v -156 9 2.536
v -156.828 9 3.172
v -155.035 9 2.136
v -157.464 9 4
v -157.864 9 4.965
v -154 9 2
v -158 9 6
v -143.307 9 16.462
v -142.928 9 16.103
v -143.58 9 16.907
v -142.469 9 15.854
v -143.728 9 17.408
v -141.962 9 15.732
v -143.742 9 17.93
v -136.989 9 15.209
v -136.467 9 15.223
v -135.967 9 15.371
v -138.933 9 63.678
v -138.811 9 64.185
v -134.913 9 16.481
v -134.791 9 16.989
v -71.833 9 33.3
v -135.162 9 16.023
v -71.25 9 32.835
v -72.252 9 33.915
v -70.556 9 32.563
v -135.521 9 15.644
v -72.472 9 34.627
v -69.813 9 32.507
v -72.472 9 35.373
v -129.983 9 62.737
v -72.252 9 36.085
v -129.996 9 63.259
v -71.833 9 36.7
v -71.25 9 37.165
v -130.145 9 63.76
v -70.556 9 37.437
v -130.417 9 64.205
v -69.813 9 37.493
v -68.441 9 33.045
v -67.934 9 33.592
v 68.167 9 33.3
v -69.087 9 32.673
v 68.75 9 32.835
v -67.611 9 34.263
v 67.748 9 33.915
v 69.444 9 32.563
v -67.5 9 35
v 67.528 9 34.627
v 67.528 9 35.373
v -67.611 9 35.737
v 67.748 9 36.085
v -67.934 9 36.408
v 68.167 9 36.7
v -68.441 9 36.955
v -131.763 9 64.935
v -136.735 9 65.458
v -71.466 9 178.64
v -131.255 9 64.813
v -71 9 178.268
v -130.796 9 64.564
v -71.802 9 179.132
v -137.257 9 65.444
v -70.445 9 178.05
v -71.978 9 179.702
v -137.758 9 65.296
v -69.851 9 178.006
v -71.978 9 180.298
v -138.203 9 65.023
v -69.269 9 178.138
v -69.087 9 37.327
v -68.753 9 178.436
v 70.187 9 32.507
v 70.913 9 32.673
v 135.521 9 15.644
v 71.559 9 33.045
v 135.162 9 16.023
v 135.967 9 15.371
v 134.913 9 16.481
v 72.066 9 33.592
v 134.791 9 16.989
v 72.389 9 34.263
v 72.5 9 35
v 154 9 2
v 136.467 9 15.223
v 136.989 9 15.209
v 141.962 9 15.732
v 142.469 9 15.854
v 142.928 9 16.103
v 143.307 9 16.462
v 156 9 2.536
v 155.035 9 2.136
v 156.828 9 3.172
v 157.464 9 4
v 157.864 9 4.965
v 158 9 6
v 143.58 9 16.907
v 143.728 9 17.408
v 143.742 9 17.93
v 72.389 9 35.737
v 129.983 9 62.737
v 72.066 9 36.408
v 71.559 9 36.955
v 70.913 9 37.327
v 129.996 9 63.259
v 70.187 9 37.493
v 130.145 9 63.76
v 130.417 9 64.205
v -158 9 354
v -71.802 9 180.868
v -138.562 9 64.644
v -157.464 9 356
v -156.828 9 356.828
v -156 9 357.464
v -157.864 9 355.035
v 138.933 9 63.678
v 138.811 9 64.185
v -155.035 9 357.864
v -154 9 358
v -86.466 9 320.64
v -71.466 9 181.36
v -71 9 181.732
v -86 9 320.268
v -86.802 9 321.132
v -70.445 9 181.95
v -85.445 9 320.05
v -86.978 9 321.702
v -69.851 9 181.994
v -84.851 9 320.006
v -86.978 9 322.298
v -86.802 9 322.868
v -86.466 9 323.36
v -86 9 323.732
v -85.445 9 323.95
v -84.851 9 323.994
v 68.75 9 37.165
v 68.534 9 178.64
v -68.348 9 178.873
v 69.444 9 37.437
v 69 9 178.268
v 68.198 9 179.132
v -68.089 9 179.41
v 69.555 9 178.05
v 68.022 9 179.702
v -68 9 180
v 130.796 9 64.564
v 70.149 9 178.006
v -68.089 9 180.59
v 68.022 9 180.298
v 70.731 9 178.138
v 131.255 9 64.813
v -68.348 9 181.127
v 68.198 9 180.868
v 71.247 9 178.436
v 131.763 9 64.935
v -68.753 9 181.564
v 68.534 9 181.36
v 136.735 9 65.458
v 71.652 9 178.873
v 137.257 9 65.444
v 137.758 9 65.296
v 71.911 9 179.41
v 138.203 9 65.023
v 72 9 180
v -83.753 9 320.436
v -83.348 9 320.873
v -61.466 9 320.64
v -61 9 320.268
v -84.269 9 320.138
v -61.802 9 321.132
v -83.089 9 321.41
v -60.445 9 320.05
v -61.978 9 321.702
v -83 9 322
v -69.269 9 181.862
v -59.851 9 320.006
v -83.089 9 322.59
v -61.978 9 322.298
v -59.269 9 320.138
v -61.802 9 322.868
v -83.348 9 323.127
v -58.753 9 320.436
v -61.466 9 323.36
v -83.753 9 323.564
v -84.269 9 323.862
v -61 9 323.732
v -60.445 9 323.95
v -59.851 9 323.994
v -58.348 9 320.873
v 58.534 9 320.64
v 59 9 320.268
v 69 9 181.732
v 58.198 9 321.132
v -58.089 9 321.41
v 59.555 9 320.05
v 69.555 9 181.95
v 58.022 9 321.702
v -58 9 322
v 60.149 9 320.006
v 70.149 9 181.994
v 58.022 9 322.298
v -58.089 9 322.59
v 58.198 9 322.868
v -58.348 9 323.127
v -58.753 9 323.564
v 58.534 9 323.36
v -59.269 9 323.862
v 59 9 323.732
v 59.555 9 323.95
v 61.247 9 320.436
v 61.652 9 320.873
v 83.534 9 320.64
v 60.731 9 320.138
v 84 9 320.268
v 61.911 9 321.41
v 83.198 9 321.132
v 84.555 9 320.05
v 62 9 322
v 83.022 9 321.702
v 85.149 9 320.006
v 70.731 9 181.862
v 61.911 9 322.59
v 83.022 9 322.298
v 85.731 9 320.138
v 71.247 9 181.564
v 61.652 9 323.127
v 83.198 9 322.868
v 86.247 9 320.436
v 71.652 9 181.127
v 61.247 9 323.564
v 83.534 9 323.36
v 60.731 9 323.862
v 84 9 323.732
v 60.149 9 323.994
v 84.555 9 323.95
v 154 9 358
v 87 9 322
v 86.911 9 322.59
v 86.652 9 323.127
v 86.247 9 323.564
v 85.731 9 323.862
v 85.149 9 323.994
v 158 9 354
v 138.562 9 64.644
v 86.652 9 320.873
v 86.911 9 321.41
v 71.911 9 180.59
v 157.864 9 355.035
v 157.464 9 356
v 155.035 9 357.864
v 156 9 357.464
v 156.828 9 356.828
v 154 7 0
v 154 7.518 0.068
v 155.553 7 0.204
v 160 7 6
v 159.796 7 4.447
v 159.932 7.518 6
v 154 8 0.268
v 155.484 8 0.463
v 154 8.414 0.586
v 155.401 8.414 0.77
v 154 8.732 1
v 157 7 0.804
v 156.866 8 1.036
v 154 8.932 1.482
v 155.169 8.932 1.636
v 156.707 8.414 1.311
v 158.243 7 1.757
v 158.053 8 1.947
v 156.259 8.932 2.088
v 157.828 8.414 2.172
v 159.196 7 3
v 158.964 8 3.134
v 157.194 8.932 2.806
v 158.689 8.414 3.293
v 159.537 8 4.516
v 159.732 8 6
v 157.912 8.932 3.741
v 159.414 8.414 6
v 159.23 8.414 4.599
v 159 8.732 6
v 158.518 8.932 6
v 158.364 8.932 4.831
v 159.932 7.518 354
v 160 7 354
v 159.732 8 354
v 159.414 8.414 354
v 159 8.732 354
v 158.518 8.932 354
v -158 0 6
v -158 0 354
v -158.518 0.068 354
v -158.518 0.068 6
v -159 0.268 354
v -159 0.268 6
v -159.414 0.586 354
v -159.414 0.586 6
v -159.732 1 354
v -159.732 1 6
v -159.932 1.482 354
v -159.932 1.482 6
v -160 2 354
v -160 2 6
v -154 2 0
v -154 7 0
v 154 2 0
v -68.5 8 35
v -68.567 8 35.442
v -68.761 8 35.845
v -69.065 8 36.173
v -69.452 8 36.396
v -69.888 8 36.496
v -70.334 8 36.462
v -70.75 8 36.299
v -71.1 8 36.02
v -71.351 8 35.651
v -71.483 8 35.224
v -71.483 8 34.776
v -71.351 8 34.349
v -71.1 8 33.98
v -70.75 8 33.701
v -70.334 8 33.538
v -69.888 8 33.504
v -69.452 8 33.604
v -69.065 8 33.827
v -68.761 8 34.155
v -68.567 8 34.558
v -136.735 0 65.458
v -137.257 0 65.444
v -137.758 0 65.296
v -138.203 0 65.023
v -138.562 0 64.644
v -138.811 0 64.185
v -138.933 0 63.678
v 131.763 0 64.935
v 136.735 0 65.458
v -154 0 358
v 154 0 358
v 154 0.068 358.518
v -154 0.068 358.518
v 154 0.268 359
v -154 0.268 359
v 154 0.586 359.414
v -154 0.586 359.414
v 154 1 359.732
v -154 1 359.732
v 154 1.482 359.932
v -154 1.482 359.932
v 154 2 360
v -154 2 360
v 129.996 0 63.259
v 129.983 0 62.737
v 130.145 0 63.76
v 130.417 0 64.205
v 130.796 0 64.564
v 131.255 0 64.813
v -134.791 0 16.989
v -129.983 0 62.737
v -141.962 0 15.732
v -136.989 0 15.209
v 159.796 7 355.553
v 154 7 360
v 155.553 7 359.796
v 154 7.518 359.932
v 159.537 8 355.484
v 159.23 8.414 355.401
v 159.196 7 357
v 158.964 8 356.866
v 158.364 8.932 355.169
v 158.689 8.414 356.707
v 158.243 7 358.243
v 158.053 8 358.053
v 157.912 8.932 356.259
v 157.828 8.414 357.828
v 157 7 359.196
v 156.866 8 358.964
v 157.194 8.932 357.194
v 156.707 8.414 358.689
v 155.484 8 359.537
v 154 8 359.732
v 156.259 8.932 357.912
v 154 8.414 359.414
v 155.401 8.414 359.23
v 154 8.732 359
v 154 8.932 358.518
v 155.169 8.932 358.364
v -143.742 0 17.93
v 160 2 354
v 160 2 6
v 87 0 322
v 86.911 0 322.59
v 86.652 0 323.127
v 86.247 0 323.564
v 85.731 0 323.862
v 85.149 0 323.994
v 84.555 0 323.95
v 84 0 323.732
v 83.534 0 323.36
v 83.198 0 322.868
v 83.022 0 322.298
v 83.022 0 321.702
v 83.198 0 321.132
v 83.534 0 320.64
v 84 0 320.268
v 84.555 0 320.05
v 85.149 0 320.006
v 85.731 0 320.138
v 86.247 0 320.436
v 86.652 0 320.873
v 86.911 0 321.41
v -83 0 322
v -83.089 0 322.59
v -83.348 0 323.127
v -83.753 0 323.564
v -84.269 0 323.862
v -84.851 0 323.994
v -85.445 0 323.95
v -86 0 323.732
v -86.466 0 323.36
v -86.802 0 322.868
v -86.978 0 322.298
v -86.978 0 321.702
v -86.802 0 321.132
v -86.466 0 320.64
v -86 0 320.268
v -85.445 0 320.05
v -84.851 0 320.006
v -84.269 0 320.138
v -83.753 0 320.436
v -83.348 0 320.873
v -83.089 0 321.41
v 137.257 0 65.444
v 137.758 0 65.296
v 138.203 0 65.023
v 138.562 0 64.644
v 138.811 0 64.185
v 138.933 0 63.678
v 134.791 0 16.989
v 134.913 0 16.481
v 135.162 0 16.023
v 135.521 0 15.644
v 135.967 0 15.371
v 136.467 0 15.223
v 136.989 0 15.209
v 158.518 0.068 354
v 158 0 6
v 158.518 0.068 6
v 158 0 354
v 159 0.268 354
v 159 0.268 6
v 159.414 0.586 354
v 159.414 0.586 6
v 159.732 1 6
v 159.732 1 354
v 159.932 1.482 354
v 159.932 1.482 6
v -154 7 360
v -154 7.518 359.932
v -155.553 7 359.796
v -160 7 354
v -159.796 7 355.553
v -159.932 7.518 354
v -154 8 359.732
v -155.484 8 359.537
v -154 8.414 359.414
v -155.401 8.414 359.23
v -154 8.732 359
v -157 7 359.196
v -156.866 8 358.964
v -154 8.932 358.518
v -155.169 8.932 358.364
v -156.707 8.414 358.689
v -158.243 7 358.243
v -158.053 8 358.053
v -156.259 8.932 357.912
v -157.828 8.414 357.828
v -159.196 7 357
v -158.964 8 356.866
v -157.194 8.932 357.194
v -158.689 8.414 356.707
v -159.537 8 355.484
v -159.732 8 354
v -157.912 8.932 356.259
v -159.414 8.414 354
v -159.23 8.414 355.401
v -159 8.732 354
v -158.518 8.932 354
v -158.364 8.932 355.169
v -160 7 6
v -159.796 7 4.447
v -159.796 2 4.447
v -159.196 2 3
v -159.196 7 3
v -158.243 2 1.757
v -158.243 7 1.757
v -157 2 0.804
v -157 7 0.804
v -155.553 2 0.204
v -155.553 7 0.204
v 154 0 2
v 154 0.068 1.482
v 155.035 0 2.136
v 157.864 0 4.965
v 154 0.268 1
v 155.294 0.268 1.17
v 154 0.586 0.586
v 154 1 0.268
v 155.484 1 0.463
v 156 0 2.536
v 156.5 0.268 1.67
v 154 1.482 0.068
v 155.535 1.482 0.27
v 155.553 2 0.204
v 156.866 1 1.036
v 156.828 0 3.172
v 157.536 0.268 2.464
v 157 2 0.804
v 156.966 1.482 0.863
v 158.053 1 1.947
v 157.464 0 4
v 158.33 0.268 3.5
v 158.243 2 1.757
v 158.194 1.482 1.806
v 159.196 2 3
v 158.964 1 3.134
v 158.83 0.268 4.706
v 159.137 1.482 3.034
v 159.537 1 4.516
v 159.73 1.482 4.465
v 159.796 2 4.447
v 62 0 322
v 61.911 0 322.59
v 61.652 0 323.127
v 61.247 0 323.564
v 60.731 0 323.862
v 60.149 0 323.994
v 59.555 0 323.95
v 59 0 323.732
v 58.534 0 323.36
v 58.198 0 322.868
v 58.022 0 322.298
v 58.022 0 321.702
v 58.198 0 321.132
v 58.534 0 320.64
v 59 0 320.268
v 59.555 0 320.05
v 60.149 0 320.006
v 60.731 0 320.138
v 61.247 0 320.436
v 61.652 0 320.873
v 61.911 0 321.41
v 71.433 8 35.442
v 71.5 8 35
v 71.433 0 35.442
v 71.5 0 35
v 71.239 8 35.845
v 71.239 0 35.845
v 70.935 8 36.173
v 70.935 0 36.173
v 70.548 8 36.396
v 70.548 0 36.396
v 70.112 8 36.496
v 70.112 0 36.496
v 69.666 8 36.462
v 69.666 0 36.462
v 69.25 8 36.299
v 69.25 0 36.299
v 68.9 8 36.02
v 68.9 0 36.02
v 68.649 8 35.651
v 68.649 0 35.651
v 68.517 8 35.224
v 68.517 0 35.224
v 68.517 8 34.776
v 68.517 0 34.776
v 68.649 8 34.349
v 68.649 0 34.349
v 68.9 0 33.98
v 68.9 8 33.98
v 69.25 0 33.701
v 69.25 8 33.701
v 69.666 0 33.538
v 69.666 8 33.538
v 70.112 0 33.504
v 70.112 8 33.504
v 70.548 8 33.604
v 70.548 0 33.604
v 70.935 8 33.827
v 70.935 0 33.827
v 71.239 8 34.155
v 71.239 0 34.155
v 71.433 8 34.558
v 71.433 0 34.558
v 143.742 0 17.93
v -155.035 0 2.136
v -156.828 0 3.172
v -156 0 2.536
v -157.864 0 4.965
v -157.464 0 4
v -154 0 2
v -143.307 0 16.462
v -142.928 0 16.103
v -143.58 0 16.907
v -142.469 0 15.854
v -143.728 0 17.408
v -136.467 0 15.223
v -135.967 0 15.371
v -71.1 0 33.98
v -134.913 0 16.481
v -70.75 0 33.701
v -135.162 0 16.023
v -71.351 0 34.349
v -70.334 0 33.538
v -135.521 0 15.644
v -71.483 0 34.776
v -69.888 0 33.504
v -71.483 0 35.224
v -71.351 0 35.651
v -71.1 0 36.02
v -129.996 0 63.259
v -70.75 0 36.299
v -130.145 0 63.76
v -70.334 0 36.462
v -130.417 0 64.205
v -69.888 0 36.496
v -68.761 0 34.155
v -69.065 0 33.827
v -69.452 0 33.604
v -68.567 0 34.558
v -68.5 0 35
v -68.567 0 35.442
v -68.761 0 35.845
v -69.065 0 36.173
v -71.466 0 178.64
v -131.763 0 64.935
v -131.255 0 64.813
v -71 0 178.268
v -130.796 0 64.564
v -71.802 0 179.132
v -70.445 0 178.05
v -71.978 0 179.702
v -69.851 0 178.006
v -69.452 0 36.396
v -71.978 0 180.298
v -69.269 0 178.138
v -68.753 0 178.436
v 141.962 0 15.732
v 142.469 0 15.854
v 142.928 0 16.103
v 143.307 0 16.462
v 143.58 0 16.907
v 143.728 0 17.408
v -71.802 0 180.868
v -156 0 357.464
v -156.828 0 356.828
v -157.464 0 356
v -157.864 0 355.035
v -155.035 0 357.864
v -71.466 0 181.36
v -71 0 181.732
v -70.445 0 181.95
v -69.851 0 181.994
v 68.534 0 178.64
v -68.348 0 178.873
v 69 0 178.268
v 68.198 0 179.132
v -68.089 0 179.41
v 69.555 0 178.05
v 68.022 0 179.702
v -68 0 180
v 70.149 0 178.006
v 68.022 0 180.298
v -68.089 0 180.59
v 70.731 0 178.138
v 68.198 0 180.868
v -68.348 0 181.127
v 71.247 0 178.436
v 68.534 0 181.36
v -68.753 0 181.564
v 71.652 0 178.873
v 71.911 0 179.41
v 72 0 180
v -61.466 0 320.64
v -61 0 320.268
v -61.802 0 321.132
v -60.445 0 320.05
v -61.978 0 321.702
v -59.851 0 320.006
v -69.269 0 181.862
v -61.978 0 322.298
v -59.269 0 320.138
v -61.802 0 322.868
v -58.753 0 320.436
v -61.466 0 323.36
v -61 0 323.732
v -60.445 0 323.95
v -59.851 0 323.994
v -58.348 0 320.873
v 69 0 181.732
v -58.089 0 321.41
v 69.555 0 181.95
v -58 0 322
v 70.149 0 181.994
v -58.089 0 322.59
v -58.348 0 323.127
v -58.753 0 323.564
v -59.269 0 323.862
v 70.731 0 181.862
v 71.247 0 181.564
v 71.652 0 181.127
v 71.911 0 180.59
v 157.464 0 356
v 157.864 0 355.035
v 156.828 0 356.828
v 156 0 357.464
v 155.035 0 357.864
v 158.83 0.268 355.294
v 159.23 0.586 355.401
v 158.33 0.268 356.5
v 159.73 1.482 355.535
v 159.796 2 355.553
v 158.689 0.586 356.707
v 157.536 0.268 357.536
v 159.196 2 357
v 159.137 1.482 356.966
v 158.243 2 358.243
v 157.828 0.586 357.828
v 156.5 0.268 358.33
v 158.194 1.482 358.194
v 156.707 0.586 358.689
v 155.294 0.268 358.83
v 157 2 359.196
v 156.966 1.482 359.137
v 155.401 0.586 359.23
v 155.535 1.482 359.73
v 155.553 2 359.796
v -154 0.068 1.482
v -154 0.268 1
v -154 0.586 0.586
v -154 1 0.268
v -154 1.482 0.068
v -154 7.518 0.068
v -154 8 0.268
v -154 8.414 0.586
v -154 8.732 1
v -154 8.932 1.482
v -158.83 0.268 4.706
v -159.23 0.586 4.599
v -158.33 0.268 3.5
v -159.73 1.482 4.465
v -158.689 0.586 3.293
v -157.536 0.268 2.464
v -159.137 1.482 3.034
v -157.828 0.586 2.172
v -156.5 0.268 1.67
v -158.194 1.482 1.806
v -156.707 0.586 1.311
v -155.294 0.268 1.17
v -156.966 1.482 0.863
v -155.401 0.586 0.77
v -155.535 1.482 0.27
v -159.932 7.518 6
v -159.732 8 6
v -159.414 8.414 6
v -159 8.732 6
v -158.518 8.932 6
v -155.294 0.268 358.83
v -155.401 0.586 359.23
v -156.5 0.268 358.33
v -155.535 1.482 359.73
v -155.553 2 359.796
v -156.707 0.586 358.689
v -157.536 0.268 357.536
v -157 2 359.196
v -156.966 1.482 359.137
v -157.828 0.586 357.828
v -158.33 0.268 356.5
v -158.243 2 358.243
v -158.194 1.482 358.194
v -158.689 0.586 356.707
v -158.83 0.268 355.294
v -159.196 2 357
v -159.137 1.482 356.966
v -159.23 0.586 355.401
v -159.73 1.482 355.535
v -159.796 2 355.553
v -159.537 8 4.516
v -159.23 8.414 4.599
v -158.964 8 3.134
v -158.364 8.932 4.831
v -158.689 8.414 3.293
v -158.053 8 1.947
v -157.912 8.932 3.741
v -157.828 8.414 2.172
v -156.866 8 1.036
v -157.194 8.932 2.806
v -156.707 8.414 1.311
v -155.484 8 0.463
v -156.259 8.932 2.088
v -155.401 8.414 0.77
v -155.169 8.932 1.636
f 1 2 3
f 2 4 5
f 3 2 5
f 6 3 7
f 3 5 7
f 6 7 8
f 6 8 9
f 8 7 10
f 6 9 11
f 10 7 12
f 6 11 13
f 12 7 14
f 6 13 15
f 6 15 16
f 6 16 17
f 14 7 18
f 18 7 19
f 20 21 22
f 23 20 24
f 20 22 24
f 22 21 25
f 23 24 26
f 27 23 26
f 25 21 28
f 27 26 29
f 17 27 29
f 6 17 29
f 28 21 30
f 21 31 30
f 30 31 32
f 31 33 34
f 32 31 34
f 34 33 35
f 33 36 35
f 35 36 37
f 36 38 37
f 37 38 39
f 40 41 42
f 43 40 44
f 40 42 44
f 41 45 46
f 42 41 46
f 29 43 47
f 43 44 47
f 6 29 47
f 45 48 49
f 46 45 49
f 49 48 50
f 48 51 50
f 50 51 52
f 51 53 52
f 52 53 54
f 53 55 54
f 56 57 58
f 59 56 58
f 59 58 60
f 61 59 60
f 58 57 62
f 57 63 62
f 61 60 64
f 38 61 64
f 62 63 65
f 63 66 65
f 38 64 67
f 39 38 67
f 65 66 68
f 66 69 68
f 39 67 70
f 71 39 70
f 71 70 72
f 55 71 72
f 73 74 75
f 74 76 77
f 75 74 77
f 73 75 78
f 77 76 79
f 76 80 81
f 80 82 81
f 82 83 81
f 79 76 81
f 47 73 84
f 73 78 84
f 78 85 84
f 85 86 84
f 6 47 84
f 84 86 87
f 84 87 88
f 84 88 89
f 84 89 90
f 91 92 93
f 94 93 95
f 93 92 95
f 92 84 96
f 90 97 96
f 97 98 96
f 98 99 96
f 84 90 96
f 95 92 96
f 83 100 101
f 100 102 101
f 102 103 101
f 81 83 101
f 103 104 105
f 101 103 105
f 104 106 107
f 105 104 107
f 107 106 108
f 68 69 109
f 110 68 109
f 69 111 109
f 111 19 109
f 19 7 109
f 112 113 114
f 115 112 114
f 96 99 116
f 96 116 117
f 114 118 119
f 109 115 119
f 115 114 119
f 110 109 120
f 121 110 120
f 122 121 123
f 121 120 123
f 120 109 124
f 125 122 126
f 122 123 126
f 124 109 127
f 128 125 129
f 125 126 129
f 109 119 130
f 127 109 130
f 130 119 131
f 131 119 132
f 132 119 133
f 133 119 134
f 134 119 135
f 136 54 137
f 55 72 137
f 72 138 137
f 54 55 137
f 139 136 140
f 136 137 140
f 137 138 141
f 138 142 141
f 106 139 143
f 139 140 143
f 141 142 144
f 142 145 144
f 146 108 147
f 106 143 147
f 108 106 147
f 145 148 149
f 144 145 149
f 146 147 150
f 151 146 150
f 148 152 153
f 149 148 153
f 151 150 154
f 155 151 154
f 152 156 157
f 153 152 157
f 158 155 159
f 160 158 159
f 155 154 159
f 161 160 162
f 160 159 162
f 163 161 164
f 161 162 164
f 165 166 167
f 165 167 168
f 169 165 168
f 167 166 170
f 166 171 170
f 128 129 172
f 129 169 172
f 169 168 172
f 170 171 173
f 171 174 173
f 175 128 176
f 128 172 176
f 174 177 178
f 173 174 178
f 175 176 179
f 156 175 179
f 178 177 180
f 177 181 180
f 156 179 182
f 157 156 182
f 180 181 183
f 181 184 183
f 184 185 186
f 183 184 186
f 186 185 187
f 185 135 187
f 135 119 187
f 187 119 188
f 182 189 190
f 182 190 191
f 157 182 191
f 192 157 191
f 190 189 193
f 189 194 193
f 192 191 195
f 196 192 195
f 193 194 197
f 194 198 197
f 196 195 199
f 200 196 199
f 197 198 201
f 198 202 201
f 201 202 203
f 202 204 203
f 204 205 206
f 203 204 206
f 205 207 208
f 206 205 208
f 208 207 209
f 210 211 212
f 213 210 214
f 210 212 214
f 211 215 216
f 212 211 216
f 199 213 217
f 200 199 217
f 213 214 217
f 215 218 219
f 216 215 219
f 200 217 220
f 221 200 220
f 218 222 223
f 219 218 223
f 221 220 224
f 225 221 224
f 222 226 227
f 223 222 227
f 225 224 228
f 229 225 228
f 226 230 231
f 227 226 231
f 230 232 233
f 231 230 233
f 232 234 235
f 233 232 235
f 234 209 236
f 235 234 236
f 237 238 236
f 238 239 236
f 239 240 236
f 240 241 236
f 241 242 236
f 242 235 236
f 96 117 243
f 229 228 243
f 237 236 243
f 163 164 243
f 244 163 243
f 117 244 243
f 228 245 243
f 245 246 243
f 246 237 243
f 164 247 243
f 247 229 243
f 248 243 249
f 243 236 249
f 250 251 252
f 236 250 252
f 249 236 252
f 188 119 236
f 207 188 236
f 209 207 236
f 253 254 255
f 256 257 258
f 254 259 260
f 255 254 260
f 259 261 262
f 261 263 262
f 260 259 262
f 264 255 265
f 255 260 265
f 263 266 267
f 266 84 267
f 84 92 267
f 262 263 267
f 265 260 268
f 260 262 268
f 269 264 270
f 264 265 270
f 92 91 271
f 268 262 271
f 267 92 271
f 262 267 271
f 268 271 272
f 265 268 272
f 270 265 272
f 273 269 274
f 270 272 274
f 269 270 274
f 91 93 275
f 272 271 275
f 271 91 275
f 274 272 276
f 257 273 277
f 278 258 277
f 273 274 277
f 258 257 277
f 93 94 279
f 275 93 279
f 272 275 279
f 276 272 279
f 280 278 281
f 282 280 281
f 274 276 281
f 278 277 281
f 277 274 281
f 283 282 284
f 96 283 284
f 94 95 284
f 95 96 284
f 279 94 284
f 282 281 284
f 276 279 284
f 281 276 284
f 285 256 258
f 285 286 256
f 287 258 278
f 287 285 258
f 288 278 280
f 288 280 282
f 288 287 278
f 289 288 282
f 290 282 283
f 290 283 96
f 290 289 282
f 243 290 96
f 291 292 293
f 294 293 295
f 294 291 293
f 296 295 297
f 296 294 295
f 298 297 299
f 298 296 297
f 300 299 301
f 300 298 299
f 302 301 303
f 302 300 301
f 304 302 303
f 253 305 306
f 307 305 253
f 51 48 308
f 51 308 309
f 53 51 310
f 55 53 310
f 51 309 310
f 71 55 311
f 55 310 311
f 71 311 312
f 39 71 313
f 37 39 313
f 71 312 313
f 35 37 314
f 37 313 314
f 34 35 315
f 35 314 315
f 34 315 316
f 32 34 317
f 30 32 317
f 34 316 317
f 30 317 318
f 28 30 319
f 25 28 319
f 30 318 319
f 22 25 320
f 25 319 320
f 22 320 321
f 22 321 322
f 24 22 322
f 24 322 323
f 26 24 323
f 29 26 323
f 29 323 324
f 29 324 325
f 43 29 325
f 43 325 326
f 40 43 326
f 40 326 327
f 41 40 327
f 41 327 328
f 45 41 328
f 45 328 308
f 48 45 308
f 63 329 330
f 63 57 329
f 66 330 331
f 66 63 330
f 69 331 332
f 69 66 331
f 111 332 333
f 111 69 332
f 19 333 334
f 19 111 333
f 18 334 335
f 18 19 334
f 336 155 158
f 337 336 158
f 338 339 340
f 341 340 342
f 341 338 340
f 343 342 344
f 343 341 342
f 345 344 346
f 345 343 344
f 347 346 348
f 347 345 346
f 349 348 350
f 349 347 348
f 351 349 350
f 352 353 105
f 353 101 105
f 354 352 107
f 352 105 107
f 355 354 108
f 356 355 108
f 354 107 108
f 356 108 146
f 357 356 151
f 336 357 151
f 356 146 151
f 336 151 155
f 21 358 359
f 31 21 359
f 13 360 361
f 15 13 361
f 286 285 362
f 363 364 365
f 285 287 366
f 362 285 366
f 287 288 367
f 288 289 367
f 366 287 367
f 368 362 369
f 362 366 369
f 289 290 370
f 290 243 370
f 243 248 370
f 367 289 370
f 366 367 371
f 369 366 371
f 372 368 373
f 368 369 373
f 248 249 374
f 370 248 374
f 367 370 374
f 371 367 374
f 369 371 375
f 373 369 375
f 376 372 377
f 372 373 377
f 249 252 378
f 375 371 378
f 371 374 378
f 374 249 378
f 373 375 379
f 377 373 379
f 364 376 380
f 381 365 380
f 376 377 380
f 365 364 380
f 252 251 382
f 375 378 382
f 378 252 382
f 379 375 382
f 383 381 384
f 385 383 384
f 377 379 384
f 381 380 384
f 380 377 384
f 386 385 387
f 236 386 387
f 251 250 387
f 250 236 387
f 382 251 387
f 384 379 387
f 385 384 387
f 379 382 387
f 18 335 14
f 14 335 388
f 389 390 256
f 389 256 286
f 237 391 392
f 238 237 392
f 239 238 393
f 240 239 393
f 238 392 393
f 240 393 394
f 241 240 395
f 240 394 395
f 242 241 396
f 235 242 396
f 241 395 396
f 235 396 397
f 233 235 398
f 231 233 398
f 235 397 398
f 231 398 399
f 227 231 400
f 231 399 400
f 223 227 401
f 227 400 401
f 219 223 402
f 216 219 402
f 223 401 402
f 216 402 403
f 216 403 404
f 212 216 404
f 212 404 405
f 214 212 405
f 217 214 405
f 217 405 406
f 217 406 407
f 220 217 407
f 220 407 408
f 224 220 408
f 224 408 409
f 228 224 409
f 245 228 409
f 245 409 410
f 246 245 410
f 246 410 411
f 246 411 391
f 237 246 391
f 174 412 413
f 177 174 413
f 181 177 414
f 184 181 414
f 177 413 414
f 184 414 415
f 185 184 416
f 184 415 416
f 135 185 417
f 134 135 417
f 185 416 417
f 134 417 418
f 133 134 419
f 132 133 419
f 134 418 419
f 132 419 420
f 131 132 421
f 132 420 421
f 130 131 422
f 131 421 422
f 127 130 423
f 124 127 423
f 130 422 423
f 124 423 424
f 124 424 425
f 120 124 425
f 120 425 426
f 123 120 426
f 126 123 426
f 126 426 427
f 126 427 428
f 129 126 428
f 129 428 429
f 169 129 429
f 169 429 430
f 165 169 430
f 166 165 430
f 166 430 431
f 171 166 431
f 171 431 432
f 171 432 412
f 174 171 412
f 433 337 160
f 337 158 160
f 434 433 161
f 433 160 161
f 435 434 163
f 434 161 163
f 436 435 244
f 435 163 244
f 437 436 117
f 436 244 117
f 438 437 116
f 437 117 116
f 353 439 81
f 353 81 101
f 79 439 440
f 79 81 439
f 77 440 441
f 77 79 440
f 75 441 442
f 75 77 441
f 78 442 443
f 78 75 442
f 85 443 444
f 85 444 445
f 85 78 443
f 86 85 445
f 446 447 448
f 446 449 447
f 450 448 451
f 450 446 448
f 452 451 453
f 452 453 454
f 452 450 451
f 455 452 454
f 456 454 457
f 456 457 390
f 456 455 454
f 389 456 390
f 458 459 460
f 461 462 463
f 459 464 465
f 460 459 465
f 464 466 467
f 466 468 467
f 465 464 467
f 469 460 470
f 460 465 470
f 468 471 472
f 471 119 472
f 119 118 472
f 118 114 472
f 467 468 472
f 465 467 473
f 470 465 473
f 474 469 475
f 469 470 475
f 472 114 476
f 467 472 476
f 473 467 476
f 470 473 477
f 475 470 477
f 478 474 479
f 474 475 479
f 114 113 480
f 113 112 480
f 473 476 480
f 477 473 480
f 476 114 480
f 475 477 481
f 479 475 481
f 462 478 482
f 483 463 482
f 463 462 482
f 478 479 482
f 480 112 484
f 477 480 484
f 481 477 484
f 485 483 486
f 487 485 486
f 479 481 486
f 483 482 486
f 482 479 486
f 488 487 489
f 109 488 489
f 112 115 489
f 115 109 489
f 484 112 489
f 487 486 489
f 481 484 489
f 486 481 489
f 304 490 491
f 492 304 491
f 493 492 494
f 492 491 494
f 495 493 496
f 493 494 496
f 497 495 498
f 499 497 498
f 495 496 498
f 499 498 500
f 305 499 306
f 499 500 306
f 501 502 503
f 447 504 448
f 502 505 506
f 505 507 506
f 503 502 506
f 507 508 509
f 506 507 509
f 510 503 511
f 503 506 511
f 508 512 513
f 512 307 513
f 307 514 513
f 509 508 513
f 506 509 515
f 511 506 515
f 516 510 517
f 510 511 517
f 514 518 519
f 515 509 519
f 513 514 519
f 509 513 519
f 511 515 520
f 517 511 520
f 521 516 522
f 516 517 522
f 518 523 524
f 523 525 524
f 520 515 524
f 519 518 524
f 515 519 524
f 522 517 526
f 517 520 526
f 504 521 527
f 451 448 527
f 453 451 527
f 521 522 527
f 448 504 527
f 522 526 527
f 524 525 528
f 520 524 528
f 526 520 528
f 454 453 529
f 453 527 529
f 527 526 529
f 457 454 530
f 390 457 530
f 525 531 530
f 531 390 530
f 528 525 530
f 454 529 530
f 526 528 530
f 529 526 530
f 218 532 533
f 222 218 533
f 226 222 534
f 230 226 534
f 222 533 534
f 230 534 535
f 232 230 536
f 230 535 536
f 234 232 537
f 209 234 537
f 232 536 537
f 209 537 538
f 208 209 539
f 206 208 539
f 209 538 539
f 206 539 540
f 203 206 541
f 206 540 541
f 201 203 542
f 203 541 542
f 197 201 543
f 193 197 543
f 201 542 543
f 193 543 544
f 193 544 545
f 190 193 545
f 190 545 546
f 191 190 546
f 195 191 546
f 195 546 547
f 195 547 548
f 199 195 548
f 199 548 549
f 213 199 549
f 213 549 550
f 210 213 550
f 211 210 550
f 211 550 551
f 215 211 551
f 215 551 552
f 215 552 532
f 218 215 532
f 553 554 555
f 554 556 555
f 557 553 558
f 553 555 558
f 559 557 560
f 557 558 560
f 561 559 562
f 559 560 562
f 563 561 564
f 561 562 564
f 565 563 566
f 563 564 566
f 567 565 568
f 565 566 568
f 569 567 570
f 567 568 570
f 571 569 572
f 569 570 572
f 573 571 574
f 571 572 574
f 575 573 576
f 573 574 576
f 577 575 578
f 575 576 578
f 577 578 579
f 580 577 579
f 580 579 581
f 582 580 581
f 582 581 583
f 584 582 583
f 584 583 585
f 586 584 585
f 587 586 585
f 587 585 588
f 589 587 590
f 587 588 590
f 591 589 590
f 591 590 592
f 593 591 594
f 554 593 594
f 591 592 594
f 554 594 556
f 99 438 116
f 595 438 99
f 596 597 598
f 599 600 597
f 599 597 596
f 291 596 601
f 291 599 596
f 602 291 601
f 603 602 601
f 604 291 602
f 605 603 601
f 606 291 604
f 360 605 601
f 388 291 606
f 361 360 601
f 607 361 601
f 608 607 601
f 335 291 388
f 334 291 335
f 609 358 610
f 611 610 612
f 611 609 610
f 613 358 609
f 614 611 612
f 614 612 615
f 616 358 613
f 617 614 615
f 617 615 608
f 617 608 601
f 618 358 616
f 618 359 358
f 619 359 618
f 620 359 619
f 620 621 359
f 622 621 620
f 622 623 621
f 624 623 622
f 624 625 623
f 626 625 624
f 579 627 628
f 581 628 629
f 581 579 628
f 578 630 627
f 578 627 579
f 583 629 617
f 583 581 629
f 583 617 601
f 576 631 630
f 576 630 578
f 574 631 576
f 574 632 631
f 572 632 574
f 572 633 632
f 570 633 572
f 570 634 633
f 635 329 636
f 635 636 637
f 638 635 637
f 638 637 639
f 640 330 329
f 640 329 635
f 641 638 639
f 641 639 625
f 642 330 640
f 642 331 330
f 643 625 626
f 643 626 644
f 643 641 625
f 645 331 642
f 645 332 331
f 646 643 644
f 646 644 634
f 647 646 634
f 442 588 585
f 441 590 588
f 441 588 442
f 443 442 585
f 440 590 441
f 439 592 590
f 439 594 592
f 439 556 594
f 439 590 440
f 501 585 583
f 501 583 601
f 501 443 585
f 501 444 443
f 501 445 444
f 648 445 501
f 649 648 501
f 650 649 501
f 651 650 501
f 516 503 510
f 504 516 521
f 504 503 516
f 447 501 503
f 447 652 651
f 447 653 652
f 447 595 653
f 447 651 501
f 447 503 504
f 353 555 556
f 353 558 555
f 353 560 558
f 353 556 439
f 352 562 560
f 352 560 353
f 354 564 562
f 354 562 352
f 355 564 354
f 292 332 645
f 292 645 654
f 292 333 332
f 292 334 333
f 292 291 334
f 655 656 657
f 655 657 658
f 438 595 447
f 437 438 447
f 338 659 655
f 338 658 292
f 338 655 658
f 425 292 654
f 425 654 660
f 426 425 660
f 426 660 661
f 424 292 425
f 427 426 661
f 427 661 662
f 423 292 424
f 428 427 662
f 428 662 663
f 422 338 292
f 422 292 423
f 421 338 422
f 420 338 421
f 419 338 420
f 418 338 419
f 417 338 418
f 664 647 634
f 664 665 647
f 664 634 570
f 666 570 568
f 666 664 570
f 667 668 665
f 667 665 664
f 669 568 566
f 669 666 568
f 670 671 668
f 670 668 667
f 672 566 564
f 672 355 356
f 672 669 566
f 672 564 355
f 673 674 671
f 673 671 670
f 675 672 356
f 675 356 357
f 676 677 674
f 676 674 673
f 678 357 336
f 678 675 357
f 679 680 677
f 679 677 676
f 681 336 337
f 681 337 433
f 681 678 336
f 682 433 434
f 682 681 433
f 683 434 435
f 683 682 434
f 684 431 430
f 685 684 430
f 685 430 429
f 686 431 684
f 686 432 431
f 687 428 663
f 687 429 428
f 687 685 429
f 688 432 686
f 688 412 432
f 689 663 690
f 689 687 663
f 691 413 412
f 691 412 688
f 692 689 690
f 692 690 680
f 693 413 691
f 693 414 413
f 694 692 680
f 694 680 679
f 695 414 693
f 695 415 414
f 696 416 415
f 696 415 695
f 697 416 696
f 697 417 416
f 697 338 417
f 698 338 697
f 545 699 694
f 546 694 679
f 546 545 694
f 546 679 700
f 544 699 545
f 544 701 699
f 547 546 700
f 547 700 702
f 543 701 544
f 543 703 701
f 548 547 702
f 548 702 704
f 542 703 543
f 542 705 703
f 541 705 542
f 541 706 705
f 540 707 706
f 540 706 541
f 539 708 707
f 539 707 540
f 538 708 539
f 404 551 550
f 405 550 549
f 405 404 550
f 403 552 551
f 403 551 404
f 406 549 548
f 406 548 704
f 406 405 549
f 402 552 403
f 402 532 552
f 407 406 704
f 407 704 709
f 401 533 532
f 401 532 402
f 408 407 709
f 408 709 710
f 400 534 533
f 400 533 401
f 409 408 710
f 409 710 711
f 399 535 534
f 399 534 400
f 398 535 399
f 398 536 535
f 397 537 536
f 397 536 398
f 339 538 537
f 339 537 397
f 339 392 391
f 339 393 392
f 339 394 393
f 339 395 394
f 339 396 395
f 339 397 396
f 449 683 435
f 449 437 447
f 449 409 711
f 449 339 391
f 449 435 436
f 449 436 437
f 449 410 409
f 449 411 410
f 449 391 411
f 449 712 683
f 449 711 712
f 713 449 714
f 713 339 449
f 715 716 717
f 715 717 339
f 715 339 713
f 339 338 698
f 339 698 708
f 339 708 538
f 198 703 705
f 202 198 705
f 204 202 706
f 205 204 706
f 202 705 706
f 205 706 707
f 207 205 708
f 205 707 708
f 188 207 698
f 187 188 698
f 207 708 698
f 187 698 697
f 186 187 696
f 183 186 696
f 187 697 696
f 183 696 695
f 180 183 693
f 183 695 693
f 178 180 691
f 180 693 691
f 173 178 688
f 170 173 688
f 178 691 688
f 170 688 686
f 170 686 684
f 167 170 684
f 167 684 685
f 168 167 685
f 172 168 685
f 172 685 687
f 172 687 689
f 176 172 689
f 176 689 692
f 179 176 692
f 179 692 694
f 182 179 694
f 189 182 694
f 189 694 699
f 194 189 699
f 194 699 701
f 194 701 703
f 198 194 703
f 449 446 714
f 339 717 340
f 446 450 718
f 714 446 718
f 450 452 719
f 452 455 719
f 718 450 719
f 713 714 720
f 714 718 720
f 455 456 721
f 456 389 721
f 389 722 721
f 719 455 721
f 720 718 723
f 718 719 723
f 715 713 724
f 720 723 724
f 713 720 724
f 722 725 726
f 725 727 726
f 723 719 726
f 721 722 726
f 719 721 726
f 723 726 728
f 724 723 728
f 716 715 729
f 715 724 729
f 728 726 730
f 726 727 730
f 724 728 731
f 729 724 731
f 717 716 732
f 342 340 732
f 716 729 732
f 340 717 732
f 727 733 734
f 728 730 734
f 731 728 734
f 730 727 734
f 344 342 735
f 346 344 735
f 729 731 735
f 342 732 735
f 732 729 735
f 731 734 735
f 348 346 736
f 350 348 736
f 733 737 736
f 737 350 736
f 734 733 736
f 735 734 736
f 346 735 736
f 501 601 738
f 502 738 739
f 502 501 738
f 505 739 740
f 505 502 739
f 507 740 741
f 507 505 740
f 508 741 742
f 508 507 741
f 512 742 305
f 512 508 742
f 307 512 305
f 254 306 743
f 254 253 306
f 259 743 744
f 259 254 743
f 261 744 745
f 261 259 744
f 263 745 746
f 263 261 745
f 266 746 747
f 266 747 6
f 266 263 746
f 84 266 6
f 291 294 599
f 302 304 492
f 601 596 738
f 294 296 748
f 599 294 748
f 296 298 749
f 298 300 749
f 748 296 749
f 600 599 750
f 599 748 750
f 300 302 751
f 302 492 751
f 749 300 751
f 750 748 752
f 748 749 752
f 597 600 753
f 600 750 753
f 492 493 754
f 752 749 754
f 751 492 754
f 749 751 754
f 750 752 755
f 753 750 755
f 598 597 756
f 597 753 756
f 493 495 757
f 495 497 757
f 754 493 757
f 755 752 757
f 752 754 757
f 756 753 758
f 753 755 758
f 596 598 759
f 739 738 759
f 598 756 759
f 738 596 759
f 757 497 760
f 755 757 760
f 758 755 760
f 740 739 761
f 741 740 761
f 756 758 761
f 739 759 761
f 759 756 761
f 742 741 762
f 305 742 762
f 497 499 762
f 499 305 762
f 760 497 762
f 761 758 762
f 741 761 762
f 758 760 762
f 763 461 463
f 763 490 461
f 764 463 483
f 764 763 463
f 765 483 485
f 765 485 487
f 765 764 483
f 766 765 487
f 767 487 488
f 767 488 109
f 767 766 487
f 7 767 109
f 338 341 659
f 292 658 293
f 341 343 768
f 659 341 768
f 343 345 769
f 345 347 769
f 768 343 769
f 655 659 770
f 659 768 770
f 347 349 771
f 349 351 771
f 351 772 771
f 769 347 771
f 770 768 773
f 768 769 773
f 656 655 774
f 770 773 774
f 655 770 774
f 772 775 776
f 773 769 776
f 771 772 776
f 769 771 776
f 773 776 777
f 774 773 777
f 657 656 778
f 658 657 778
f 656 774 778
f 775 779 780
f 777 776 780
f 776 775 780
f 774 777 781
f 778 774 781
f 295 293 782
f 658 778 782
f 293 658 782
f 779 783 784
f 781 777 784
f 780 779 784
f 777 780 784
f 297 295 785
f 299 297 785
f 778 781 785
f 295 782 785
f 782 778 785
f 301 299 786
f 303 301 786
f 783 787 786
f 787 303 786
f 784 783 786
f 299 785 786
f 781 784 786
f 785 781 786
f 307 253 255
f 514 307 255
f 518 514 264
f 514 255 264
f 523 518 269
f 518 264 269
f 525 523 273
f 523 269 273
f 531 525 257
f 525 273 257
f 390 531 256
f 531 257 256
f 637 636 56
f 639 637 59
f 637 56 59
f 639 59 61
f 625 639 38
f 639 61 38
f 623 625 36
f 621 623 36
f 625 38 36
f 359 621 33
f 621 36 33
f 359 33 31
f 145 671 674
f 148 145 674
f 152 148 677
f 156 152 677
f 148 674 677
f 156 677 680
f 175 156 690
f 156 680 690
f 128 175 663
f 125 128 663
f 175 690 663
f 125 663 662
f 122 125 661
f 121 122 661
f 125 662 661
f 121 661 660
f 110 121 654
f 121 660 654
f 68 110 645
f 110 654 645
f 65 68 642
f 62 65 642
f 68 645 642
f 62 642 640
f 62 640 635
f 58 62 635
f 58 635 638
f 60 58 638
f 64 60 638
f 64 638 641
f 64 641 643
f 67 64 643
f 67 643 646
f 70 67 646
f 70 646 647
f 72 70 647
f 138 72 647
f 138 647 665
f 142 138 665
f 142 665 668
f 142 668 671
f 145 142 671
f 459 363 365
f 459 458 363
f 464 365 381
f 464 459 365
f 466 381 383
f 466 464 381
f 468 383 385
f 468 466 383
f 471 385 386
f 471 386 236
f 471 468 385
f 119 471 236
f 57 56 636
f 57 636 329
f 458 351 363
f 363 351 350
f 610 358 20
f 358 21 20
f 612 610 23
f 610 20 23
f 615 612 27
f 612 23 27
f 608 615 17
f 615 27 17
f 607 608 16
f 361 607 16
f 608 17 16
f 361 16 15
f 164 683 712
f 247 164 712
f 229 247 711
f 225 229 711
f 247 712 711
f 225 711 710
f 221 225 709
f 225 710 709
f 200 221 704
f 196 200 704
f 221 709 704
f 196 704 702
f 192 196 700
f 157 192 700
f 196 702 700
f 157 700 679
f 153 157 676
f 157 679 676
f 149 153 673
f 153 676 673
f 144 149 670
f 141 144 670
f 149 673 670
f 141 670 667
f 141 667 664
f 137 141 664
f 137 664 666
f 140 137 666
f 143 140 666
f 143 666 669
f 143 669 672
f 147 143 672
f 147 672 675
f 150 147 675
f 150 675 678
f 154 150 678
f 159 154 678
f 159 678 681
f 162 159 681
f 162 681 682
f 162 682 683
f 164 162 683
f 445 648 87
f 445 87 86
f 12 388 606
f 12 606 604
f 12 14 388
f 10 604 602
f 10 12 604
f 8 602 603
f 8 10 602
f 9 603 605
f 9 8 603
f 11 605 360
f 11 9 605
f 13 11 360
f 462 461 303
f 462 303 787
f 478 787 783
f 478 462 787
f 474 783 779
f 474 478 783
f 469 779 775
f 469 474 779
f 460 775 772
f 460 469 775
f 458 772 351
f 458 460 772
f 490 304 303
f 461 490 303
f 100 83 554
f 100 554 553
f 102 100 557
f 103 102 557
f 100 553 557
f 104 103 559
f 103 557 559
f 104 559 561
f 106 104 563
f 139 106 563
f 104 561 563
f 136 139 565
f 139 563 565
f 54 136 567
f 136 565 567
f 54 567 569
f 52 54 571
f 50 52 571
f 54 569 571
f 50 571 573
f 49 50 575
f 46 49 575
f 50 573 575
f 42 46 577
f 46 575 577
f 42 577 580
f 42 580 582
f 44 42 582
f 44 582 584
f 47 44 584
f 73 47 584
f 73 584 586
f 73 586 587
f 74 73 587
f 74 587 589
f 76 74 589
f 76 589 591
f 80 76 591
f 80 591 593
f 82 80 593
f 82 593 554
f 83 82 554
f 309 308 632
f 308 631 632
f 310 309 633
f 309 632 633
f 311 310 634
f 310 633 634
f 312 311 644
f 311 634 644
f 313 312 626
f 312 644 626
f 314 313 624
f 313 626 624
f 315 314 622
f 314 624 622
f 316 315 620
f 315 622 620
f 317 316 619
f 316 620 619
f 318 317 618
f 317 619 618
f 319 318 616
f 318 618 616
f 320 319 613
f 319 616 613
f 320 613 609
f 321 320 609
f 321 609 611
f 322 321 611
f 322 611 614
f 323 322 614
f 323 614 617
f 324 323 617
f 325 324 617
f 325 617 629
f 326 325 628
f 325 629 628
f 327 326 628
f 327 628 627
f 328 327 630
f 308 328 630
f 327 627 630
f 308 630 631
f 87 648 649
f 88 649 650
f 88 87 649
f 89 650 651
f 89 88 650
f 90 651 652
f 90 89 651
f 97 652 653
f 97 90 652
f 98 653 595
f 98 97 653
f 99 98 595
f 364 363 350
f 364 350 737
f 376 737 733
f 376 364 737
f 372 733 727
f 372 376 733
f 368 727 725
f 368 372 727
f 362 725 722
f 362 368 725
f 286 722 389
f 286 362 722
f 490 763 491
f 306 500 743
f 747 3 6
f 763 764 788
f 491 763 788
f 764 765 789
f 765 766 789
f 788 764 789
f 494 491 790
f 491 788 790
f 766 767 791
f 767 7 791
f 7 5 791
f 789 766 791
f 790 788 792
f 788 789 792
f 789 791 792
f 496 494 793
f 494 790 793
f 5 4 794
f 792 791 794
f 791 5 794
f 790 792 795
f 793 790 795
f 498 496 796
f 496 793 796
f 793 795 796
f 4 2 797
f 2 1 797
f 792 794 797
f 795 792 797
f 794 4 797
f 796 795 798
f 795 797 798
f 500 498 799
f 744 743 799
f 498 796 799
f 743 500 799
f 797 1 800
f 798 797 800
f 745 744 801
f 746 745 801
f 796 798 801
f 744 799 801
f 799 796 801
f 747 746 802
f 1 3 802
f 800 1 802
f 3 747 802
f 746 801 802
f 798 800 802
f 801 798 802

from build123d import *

# Parameters (mm, degrees)
F0_W           = 320
F0_H           = 360
F1_DEPTH       = 9
F3_DEPTH       = 9.001
F4_R           = 2
F5_R           = 6
F7_D           = 3
F7_CSINK_D     = 5
F7_CSINK_ANGLE = 90
F9_D           = 4
F10_R          = 2


# Not quite as in the source:
# - a pattern or mirror of a feature is missing from the dataset's text; its kind, count and spacing are read off the source's solid
# - a feature names something its author has since deleted; it is built from what else it names


with BuildPart() as f1:
    # F0 (on Front) → F1 (new body)
    with BuildSketch(Plane.XZ):
        with Locations((0, 180)):
            Rectangle(F0_W, F0_H)
    extrude(amount=-F1_DEPTH)

    # F2 (on Front) → F3 (cut, through all)
    with BuildSketch(Plane.XZ):
        Polygon((-129.7735768366, 64.7260947684), (-138.7242738949, 65.6668509378), (-143.9506970583, 15.9407561694), (-135, 15), align=None)
    f3 = extrude(amount=-F3_DEPTH, mode=Mode.SUBTRACT)

    # F3_copies: F3 across plane
    add(f3.mirror(Plane(origin=(0, 0, 0), x_dir=(0, 0, 1), z_dir=(1, 0, 0))), mode=Mode.SUBTRACT)

    # F4
    f4_edges = [f1.edges().sort_by_distance(p)[0] for p in [
        (-135, 4.5, 15),
        (-143.950697, 4.5, 15.940756),
        (-129.773577, 4.5, 64.726095),
        (-138.724274, 4.5, 65.666851),
    ]]
    fillet(f4_edges, radius=F4_R)

    # F5
    f5_edges = [f1.edges().sort_by_distance(p)[0] for p in [
        (160, 4.5, 0),
        (160, 4.5, 360),
        (-160, 4.5, 360),
        (-160, 4.5, 0),
    ]]
    fillet(f5_edges, radius=F5_R)

    # F7 (through all)
    with Locations(Plane(origin=(0, 9, 0), x_dir=(-1, 0, 0), z_dir=(0, 1, 0))):
        with Locations((-70, 35), (70, 35)):
            CounterSinkHole(F7_D / 2, F7_CSINK_D / 2, counter_sink_angle=F7_CSINK_ANGLE)

    # F9 (through all)
    with Locations(Plane(origin=(0, 9, 0), x_dir=(-1, 0, 0), z_dir=(0, 1, 0))):
        with Locations((-70, 180), (70, 180), (85, 322), (60, 322), (-60, 322), (-85, 322)):
            Hole(F9_D / 2)

    # F10
    f10_edges = [f1.edges().sort_by_distance(p)[0] for p in [
        (160, 9, 180),
        (160, 0, 180),
        (0, 0, 360),
        (158.242641, 0, 358.242641),
        (-158.242641, 0, 358.242641),
        (-160, 0, 180),
        (158.242641, 0, 1.757359),
        (-158.242641, 0, 1.757359),
        (0, 0, 0),
        (0, 9, 360),
        (158.242641, 9, 358.242641),
        (-158.242641, 9, 358.242641),
        (-160, 9, 180),
        (158.242641, 9, 1.757359),
        (-158.242641, 9, 1.757359),
        (0, 9, 0),
        (143.950697, 4.5, 15.940756),
        (138.724274, 4.5, 65.666851),
        (129.773577, 4.5, 64.726095),
        (135, 4.5, 15),
    ]]
    fillet(f10_edges, radius=F10_R)


solid = f1.part
